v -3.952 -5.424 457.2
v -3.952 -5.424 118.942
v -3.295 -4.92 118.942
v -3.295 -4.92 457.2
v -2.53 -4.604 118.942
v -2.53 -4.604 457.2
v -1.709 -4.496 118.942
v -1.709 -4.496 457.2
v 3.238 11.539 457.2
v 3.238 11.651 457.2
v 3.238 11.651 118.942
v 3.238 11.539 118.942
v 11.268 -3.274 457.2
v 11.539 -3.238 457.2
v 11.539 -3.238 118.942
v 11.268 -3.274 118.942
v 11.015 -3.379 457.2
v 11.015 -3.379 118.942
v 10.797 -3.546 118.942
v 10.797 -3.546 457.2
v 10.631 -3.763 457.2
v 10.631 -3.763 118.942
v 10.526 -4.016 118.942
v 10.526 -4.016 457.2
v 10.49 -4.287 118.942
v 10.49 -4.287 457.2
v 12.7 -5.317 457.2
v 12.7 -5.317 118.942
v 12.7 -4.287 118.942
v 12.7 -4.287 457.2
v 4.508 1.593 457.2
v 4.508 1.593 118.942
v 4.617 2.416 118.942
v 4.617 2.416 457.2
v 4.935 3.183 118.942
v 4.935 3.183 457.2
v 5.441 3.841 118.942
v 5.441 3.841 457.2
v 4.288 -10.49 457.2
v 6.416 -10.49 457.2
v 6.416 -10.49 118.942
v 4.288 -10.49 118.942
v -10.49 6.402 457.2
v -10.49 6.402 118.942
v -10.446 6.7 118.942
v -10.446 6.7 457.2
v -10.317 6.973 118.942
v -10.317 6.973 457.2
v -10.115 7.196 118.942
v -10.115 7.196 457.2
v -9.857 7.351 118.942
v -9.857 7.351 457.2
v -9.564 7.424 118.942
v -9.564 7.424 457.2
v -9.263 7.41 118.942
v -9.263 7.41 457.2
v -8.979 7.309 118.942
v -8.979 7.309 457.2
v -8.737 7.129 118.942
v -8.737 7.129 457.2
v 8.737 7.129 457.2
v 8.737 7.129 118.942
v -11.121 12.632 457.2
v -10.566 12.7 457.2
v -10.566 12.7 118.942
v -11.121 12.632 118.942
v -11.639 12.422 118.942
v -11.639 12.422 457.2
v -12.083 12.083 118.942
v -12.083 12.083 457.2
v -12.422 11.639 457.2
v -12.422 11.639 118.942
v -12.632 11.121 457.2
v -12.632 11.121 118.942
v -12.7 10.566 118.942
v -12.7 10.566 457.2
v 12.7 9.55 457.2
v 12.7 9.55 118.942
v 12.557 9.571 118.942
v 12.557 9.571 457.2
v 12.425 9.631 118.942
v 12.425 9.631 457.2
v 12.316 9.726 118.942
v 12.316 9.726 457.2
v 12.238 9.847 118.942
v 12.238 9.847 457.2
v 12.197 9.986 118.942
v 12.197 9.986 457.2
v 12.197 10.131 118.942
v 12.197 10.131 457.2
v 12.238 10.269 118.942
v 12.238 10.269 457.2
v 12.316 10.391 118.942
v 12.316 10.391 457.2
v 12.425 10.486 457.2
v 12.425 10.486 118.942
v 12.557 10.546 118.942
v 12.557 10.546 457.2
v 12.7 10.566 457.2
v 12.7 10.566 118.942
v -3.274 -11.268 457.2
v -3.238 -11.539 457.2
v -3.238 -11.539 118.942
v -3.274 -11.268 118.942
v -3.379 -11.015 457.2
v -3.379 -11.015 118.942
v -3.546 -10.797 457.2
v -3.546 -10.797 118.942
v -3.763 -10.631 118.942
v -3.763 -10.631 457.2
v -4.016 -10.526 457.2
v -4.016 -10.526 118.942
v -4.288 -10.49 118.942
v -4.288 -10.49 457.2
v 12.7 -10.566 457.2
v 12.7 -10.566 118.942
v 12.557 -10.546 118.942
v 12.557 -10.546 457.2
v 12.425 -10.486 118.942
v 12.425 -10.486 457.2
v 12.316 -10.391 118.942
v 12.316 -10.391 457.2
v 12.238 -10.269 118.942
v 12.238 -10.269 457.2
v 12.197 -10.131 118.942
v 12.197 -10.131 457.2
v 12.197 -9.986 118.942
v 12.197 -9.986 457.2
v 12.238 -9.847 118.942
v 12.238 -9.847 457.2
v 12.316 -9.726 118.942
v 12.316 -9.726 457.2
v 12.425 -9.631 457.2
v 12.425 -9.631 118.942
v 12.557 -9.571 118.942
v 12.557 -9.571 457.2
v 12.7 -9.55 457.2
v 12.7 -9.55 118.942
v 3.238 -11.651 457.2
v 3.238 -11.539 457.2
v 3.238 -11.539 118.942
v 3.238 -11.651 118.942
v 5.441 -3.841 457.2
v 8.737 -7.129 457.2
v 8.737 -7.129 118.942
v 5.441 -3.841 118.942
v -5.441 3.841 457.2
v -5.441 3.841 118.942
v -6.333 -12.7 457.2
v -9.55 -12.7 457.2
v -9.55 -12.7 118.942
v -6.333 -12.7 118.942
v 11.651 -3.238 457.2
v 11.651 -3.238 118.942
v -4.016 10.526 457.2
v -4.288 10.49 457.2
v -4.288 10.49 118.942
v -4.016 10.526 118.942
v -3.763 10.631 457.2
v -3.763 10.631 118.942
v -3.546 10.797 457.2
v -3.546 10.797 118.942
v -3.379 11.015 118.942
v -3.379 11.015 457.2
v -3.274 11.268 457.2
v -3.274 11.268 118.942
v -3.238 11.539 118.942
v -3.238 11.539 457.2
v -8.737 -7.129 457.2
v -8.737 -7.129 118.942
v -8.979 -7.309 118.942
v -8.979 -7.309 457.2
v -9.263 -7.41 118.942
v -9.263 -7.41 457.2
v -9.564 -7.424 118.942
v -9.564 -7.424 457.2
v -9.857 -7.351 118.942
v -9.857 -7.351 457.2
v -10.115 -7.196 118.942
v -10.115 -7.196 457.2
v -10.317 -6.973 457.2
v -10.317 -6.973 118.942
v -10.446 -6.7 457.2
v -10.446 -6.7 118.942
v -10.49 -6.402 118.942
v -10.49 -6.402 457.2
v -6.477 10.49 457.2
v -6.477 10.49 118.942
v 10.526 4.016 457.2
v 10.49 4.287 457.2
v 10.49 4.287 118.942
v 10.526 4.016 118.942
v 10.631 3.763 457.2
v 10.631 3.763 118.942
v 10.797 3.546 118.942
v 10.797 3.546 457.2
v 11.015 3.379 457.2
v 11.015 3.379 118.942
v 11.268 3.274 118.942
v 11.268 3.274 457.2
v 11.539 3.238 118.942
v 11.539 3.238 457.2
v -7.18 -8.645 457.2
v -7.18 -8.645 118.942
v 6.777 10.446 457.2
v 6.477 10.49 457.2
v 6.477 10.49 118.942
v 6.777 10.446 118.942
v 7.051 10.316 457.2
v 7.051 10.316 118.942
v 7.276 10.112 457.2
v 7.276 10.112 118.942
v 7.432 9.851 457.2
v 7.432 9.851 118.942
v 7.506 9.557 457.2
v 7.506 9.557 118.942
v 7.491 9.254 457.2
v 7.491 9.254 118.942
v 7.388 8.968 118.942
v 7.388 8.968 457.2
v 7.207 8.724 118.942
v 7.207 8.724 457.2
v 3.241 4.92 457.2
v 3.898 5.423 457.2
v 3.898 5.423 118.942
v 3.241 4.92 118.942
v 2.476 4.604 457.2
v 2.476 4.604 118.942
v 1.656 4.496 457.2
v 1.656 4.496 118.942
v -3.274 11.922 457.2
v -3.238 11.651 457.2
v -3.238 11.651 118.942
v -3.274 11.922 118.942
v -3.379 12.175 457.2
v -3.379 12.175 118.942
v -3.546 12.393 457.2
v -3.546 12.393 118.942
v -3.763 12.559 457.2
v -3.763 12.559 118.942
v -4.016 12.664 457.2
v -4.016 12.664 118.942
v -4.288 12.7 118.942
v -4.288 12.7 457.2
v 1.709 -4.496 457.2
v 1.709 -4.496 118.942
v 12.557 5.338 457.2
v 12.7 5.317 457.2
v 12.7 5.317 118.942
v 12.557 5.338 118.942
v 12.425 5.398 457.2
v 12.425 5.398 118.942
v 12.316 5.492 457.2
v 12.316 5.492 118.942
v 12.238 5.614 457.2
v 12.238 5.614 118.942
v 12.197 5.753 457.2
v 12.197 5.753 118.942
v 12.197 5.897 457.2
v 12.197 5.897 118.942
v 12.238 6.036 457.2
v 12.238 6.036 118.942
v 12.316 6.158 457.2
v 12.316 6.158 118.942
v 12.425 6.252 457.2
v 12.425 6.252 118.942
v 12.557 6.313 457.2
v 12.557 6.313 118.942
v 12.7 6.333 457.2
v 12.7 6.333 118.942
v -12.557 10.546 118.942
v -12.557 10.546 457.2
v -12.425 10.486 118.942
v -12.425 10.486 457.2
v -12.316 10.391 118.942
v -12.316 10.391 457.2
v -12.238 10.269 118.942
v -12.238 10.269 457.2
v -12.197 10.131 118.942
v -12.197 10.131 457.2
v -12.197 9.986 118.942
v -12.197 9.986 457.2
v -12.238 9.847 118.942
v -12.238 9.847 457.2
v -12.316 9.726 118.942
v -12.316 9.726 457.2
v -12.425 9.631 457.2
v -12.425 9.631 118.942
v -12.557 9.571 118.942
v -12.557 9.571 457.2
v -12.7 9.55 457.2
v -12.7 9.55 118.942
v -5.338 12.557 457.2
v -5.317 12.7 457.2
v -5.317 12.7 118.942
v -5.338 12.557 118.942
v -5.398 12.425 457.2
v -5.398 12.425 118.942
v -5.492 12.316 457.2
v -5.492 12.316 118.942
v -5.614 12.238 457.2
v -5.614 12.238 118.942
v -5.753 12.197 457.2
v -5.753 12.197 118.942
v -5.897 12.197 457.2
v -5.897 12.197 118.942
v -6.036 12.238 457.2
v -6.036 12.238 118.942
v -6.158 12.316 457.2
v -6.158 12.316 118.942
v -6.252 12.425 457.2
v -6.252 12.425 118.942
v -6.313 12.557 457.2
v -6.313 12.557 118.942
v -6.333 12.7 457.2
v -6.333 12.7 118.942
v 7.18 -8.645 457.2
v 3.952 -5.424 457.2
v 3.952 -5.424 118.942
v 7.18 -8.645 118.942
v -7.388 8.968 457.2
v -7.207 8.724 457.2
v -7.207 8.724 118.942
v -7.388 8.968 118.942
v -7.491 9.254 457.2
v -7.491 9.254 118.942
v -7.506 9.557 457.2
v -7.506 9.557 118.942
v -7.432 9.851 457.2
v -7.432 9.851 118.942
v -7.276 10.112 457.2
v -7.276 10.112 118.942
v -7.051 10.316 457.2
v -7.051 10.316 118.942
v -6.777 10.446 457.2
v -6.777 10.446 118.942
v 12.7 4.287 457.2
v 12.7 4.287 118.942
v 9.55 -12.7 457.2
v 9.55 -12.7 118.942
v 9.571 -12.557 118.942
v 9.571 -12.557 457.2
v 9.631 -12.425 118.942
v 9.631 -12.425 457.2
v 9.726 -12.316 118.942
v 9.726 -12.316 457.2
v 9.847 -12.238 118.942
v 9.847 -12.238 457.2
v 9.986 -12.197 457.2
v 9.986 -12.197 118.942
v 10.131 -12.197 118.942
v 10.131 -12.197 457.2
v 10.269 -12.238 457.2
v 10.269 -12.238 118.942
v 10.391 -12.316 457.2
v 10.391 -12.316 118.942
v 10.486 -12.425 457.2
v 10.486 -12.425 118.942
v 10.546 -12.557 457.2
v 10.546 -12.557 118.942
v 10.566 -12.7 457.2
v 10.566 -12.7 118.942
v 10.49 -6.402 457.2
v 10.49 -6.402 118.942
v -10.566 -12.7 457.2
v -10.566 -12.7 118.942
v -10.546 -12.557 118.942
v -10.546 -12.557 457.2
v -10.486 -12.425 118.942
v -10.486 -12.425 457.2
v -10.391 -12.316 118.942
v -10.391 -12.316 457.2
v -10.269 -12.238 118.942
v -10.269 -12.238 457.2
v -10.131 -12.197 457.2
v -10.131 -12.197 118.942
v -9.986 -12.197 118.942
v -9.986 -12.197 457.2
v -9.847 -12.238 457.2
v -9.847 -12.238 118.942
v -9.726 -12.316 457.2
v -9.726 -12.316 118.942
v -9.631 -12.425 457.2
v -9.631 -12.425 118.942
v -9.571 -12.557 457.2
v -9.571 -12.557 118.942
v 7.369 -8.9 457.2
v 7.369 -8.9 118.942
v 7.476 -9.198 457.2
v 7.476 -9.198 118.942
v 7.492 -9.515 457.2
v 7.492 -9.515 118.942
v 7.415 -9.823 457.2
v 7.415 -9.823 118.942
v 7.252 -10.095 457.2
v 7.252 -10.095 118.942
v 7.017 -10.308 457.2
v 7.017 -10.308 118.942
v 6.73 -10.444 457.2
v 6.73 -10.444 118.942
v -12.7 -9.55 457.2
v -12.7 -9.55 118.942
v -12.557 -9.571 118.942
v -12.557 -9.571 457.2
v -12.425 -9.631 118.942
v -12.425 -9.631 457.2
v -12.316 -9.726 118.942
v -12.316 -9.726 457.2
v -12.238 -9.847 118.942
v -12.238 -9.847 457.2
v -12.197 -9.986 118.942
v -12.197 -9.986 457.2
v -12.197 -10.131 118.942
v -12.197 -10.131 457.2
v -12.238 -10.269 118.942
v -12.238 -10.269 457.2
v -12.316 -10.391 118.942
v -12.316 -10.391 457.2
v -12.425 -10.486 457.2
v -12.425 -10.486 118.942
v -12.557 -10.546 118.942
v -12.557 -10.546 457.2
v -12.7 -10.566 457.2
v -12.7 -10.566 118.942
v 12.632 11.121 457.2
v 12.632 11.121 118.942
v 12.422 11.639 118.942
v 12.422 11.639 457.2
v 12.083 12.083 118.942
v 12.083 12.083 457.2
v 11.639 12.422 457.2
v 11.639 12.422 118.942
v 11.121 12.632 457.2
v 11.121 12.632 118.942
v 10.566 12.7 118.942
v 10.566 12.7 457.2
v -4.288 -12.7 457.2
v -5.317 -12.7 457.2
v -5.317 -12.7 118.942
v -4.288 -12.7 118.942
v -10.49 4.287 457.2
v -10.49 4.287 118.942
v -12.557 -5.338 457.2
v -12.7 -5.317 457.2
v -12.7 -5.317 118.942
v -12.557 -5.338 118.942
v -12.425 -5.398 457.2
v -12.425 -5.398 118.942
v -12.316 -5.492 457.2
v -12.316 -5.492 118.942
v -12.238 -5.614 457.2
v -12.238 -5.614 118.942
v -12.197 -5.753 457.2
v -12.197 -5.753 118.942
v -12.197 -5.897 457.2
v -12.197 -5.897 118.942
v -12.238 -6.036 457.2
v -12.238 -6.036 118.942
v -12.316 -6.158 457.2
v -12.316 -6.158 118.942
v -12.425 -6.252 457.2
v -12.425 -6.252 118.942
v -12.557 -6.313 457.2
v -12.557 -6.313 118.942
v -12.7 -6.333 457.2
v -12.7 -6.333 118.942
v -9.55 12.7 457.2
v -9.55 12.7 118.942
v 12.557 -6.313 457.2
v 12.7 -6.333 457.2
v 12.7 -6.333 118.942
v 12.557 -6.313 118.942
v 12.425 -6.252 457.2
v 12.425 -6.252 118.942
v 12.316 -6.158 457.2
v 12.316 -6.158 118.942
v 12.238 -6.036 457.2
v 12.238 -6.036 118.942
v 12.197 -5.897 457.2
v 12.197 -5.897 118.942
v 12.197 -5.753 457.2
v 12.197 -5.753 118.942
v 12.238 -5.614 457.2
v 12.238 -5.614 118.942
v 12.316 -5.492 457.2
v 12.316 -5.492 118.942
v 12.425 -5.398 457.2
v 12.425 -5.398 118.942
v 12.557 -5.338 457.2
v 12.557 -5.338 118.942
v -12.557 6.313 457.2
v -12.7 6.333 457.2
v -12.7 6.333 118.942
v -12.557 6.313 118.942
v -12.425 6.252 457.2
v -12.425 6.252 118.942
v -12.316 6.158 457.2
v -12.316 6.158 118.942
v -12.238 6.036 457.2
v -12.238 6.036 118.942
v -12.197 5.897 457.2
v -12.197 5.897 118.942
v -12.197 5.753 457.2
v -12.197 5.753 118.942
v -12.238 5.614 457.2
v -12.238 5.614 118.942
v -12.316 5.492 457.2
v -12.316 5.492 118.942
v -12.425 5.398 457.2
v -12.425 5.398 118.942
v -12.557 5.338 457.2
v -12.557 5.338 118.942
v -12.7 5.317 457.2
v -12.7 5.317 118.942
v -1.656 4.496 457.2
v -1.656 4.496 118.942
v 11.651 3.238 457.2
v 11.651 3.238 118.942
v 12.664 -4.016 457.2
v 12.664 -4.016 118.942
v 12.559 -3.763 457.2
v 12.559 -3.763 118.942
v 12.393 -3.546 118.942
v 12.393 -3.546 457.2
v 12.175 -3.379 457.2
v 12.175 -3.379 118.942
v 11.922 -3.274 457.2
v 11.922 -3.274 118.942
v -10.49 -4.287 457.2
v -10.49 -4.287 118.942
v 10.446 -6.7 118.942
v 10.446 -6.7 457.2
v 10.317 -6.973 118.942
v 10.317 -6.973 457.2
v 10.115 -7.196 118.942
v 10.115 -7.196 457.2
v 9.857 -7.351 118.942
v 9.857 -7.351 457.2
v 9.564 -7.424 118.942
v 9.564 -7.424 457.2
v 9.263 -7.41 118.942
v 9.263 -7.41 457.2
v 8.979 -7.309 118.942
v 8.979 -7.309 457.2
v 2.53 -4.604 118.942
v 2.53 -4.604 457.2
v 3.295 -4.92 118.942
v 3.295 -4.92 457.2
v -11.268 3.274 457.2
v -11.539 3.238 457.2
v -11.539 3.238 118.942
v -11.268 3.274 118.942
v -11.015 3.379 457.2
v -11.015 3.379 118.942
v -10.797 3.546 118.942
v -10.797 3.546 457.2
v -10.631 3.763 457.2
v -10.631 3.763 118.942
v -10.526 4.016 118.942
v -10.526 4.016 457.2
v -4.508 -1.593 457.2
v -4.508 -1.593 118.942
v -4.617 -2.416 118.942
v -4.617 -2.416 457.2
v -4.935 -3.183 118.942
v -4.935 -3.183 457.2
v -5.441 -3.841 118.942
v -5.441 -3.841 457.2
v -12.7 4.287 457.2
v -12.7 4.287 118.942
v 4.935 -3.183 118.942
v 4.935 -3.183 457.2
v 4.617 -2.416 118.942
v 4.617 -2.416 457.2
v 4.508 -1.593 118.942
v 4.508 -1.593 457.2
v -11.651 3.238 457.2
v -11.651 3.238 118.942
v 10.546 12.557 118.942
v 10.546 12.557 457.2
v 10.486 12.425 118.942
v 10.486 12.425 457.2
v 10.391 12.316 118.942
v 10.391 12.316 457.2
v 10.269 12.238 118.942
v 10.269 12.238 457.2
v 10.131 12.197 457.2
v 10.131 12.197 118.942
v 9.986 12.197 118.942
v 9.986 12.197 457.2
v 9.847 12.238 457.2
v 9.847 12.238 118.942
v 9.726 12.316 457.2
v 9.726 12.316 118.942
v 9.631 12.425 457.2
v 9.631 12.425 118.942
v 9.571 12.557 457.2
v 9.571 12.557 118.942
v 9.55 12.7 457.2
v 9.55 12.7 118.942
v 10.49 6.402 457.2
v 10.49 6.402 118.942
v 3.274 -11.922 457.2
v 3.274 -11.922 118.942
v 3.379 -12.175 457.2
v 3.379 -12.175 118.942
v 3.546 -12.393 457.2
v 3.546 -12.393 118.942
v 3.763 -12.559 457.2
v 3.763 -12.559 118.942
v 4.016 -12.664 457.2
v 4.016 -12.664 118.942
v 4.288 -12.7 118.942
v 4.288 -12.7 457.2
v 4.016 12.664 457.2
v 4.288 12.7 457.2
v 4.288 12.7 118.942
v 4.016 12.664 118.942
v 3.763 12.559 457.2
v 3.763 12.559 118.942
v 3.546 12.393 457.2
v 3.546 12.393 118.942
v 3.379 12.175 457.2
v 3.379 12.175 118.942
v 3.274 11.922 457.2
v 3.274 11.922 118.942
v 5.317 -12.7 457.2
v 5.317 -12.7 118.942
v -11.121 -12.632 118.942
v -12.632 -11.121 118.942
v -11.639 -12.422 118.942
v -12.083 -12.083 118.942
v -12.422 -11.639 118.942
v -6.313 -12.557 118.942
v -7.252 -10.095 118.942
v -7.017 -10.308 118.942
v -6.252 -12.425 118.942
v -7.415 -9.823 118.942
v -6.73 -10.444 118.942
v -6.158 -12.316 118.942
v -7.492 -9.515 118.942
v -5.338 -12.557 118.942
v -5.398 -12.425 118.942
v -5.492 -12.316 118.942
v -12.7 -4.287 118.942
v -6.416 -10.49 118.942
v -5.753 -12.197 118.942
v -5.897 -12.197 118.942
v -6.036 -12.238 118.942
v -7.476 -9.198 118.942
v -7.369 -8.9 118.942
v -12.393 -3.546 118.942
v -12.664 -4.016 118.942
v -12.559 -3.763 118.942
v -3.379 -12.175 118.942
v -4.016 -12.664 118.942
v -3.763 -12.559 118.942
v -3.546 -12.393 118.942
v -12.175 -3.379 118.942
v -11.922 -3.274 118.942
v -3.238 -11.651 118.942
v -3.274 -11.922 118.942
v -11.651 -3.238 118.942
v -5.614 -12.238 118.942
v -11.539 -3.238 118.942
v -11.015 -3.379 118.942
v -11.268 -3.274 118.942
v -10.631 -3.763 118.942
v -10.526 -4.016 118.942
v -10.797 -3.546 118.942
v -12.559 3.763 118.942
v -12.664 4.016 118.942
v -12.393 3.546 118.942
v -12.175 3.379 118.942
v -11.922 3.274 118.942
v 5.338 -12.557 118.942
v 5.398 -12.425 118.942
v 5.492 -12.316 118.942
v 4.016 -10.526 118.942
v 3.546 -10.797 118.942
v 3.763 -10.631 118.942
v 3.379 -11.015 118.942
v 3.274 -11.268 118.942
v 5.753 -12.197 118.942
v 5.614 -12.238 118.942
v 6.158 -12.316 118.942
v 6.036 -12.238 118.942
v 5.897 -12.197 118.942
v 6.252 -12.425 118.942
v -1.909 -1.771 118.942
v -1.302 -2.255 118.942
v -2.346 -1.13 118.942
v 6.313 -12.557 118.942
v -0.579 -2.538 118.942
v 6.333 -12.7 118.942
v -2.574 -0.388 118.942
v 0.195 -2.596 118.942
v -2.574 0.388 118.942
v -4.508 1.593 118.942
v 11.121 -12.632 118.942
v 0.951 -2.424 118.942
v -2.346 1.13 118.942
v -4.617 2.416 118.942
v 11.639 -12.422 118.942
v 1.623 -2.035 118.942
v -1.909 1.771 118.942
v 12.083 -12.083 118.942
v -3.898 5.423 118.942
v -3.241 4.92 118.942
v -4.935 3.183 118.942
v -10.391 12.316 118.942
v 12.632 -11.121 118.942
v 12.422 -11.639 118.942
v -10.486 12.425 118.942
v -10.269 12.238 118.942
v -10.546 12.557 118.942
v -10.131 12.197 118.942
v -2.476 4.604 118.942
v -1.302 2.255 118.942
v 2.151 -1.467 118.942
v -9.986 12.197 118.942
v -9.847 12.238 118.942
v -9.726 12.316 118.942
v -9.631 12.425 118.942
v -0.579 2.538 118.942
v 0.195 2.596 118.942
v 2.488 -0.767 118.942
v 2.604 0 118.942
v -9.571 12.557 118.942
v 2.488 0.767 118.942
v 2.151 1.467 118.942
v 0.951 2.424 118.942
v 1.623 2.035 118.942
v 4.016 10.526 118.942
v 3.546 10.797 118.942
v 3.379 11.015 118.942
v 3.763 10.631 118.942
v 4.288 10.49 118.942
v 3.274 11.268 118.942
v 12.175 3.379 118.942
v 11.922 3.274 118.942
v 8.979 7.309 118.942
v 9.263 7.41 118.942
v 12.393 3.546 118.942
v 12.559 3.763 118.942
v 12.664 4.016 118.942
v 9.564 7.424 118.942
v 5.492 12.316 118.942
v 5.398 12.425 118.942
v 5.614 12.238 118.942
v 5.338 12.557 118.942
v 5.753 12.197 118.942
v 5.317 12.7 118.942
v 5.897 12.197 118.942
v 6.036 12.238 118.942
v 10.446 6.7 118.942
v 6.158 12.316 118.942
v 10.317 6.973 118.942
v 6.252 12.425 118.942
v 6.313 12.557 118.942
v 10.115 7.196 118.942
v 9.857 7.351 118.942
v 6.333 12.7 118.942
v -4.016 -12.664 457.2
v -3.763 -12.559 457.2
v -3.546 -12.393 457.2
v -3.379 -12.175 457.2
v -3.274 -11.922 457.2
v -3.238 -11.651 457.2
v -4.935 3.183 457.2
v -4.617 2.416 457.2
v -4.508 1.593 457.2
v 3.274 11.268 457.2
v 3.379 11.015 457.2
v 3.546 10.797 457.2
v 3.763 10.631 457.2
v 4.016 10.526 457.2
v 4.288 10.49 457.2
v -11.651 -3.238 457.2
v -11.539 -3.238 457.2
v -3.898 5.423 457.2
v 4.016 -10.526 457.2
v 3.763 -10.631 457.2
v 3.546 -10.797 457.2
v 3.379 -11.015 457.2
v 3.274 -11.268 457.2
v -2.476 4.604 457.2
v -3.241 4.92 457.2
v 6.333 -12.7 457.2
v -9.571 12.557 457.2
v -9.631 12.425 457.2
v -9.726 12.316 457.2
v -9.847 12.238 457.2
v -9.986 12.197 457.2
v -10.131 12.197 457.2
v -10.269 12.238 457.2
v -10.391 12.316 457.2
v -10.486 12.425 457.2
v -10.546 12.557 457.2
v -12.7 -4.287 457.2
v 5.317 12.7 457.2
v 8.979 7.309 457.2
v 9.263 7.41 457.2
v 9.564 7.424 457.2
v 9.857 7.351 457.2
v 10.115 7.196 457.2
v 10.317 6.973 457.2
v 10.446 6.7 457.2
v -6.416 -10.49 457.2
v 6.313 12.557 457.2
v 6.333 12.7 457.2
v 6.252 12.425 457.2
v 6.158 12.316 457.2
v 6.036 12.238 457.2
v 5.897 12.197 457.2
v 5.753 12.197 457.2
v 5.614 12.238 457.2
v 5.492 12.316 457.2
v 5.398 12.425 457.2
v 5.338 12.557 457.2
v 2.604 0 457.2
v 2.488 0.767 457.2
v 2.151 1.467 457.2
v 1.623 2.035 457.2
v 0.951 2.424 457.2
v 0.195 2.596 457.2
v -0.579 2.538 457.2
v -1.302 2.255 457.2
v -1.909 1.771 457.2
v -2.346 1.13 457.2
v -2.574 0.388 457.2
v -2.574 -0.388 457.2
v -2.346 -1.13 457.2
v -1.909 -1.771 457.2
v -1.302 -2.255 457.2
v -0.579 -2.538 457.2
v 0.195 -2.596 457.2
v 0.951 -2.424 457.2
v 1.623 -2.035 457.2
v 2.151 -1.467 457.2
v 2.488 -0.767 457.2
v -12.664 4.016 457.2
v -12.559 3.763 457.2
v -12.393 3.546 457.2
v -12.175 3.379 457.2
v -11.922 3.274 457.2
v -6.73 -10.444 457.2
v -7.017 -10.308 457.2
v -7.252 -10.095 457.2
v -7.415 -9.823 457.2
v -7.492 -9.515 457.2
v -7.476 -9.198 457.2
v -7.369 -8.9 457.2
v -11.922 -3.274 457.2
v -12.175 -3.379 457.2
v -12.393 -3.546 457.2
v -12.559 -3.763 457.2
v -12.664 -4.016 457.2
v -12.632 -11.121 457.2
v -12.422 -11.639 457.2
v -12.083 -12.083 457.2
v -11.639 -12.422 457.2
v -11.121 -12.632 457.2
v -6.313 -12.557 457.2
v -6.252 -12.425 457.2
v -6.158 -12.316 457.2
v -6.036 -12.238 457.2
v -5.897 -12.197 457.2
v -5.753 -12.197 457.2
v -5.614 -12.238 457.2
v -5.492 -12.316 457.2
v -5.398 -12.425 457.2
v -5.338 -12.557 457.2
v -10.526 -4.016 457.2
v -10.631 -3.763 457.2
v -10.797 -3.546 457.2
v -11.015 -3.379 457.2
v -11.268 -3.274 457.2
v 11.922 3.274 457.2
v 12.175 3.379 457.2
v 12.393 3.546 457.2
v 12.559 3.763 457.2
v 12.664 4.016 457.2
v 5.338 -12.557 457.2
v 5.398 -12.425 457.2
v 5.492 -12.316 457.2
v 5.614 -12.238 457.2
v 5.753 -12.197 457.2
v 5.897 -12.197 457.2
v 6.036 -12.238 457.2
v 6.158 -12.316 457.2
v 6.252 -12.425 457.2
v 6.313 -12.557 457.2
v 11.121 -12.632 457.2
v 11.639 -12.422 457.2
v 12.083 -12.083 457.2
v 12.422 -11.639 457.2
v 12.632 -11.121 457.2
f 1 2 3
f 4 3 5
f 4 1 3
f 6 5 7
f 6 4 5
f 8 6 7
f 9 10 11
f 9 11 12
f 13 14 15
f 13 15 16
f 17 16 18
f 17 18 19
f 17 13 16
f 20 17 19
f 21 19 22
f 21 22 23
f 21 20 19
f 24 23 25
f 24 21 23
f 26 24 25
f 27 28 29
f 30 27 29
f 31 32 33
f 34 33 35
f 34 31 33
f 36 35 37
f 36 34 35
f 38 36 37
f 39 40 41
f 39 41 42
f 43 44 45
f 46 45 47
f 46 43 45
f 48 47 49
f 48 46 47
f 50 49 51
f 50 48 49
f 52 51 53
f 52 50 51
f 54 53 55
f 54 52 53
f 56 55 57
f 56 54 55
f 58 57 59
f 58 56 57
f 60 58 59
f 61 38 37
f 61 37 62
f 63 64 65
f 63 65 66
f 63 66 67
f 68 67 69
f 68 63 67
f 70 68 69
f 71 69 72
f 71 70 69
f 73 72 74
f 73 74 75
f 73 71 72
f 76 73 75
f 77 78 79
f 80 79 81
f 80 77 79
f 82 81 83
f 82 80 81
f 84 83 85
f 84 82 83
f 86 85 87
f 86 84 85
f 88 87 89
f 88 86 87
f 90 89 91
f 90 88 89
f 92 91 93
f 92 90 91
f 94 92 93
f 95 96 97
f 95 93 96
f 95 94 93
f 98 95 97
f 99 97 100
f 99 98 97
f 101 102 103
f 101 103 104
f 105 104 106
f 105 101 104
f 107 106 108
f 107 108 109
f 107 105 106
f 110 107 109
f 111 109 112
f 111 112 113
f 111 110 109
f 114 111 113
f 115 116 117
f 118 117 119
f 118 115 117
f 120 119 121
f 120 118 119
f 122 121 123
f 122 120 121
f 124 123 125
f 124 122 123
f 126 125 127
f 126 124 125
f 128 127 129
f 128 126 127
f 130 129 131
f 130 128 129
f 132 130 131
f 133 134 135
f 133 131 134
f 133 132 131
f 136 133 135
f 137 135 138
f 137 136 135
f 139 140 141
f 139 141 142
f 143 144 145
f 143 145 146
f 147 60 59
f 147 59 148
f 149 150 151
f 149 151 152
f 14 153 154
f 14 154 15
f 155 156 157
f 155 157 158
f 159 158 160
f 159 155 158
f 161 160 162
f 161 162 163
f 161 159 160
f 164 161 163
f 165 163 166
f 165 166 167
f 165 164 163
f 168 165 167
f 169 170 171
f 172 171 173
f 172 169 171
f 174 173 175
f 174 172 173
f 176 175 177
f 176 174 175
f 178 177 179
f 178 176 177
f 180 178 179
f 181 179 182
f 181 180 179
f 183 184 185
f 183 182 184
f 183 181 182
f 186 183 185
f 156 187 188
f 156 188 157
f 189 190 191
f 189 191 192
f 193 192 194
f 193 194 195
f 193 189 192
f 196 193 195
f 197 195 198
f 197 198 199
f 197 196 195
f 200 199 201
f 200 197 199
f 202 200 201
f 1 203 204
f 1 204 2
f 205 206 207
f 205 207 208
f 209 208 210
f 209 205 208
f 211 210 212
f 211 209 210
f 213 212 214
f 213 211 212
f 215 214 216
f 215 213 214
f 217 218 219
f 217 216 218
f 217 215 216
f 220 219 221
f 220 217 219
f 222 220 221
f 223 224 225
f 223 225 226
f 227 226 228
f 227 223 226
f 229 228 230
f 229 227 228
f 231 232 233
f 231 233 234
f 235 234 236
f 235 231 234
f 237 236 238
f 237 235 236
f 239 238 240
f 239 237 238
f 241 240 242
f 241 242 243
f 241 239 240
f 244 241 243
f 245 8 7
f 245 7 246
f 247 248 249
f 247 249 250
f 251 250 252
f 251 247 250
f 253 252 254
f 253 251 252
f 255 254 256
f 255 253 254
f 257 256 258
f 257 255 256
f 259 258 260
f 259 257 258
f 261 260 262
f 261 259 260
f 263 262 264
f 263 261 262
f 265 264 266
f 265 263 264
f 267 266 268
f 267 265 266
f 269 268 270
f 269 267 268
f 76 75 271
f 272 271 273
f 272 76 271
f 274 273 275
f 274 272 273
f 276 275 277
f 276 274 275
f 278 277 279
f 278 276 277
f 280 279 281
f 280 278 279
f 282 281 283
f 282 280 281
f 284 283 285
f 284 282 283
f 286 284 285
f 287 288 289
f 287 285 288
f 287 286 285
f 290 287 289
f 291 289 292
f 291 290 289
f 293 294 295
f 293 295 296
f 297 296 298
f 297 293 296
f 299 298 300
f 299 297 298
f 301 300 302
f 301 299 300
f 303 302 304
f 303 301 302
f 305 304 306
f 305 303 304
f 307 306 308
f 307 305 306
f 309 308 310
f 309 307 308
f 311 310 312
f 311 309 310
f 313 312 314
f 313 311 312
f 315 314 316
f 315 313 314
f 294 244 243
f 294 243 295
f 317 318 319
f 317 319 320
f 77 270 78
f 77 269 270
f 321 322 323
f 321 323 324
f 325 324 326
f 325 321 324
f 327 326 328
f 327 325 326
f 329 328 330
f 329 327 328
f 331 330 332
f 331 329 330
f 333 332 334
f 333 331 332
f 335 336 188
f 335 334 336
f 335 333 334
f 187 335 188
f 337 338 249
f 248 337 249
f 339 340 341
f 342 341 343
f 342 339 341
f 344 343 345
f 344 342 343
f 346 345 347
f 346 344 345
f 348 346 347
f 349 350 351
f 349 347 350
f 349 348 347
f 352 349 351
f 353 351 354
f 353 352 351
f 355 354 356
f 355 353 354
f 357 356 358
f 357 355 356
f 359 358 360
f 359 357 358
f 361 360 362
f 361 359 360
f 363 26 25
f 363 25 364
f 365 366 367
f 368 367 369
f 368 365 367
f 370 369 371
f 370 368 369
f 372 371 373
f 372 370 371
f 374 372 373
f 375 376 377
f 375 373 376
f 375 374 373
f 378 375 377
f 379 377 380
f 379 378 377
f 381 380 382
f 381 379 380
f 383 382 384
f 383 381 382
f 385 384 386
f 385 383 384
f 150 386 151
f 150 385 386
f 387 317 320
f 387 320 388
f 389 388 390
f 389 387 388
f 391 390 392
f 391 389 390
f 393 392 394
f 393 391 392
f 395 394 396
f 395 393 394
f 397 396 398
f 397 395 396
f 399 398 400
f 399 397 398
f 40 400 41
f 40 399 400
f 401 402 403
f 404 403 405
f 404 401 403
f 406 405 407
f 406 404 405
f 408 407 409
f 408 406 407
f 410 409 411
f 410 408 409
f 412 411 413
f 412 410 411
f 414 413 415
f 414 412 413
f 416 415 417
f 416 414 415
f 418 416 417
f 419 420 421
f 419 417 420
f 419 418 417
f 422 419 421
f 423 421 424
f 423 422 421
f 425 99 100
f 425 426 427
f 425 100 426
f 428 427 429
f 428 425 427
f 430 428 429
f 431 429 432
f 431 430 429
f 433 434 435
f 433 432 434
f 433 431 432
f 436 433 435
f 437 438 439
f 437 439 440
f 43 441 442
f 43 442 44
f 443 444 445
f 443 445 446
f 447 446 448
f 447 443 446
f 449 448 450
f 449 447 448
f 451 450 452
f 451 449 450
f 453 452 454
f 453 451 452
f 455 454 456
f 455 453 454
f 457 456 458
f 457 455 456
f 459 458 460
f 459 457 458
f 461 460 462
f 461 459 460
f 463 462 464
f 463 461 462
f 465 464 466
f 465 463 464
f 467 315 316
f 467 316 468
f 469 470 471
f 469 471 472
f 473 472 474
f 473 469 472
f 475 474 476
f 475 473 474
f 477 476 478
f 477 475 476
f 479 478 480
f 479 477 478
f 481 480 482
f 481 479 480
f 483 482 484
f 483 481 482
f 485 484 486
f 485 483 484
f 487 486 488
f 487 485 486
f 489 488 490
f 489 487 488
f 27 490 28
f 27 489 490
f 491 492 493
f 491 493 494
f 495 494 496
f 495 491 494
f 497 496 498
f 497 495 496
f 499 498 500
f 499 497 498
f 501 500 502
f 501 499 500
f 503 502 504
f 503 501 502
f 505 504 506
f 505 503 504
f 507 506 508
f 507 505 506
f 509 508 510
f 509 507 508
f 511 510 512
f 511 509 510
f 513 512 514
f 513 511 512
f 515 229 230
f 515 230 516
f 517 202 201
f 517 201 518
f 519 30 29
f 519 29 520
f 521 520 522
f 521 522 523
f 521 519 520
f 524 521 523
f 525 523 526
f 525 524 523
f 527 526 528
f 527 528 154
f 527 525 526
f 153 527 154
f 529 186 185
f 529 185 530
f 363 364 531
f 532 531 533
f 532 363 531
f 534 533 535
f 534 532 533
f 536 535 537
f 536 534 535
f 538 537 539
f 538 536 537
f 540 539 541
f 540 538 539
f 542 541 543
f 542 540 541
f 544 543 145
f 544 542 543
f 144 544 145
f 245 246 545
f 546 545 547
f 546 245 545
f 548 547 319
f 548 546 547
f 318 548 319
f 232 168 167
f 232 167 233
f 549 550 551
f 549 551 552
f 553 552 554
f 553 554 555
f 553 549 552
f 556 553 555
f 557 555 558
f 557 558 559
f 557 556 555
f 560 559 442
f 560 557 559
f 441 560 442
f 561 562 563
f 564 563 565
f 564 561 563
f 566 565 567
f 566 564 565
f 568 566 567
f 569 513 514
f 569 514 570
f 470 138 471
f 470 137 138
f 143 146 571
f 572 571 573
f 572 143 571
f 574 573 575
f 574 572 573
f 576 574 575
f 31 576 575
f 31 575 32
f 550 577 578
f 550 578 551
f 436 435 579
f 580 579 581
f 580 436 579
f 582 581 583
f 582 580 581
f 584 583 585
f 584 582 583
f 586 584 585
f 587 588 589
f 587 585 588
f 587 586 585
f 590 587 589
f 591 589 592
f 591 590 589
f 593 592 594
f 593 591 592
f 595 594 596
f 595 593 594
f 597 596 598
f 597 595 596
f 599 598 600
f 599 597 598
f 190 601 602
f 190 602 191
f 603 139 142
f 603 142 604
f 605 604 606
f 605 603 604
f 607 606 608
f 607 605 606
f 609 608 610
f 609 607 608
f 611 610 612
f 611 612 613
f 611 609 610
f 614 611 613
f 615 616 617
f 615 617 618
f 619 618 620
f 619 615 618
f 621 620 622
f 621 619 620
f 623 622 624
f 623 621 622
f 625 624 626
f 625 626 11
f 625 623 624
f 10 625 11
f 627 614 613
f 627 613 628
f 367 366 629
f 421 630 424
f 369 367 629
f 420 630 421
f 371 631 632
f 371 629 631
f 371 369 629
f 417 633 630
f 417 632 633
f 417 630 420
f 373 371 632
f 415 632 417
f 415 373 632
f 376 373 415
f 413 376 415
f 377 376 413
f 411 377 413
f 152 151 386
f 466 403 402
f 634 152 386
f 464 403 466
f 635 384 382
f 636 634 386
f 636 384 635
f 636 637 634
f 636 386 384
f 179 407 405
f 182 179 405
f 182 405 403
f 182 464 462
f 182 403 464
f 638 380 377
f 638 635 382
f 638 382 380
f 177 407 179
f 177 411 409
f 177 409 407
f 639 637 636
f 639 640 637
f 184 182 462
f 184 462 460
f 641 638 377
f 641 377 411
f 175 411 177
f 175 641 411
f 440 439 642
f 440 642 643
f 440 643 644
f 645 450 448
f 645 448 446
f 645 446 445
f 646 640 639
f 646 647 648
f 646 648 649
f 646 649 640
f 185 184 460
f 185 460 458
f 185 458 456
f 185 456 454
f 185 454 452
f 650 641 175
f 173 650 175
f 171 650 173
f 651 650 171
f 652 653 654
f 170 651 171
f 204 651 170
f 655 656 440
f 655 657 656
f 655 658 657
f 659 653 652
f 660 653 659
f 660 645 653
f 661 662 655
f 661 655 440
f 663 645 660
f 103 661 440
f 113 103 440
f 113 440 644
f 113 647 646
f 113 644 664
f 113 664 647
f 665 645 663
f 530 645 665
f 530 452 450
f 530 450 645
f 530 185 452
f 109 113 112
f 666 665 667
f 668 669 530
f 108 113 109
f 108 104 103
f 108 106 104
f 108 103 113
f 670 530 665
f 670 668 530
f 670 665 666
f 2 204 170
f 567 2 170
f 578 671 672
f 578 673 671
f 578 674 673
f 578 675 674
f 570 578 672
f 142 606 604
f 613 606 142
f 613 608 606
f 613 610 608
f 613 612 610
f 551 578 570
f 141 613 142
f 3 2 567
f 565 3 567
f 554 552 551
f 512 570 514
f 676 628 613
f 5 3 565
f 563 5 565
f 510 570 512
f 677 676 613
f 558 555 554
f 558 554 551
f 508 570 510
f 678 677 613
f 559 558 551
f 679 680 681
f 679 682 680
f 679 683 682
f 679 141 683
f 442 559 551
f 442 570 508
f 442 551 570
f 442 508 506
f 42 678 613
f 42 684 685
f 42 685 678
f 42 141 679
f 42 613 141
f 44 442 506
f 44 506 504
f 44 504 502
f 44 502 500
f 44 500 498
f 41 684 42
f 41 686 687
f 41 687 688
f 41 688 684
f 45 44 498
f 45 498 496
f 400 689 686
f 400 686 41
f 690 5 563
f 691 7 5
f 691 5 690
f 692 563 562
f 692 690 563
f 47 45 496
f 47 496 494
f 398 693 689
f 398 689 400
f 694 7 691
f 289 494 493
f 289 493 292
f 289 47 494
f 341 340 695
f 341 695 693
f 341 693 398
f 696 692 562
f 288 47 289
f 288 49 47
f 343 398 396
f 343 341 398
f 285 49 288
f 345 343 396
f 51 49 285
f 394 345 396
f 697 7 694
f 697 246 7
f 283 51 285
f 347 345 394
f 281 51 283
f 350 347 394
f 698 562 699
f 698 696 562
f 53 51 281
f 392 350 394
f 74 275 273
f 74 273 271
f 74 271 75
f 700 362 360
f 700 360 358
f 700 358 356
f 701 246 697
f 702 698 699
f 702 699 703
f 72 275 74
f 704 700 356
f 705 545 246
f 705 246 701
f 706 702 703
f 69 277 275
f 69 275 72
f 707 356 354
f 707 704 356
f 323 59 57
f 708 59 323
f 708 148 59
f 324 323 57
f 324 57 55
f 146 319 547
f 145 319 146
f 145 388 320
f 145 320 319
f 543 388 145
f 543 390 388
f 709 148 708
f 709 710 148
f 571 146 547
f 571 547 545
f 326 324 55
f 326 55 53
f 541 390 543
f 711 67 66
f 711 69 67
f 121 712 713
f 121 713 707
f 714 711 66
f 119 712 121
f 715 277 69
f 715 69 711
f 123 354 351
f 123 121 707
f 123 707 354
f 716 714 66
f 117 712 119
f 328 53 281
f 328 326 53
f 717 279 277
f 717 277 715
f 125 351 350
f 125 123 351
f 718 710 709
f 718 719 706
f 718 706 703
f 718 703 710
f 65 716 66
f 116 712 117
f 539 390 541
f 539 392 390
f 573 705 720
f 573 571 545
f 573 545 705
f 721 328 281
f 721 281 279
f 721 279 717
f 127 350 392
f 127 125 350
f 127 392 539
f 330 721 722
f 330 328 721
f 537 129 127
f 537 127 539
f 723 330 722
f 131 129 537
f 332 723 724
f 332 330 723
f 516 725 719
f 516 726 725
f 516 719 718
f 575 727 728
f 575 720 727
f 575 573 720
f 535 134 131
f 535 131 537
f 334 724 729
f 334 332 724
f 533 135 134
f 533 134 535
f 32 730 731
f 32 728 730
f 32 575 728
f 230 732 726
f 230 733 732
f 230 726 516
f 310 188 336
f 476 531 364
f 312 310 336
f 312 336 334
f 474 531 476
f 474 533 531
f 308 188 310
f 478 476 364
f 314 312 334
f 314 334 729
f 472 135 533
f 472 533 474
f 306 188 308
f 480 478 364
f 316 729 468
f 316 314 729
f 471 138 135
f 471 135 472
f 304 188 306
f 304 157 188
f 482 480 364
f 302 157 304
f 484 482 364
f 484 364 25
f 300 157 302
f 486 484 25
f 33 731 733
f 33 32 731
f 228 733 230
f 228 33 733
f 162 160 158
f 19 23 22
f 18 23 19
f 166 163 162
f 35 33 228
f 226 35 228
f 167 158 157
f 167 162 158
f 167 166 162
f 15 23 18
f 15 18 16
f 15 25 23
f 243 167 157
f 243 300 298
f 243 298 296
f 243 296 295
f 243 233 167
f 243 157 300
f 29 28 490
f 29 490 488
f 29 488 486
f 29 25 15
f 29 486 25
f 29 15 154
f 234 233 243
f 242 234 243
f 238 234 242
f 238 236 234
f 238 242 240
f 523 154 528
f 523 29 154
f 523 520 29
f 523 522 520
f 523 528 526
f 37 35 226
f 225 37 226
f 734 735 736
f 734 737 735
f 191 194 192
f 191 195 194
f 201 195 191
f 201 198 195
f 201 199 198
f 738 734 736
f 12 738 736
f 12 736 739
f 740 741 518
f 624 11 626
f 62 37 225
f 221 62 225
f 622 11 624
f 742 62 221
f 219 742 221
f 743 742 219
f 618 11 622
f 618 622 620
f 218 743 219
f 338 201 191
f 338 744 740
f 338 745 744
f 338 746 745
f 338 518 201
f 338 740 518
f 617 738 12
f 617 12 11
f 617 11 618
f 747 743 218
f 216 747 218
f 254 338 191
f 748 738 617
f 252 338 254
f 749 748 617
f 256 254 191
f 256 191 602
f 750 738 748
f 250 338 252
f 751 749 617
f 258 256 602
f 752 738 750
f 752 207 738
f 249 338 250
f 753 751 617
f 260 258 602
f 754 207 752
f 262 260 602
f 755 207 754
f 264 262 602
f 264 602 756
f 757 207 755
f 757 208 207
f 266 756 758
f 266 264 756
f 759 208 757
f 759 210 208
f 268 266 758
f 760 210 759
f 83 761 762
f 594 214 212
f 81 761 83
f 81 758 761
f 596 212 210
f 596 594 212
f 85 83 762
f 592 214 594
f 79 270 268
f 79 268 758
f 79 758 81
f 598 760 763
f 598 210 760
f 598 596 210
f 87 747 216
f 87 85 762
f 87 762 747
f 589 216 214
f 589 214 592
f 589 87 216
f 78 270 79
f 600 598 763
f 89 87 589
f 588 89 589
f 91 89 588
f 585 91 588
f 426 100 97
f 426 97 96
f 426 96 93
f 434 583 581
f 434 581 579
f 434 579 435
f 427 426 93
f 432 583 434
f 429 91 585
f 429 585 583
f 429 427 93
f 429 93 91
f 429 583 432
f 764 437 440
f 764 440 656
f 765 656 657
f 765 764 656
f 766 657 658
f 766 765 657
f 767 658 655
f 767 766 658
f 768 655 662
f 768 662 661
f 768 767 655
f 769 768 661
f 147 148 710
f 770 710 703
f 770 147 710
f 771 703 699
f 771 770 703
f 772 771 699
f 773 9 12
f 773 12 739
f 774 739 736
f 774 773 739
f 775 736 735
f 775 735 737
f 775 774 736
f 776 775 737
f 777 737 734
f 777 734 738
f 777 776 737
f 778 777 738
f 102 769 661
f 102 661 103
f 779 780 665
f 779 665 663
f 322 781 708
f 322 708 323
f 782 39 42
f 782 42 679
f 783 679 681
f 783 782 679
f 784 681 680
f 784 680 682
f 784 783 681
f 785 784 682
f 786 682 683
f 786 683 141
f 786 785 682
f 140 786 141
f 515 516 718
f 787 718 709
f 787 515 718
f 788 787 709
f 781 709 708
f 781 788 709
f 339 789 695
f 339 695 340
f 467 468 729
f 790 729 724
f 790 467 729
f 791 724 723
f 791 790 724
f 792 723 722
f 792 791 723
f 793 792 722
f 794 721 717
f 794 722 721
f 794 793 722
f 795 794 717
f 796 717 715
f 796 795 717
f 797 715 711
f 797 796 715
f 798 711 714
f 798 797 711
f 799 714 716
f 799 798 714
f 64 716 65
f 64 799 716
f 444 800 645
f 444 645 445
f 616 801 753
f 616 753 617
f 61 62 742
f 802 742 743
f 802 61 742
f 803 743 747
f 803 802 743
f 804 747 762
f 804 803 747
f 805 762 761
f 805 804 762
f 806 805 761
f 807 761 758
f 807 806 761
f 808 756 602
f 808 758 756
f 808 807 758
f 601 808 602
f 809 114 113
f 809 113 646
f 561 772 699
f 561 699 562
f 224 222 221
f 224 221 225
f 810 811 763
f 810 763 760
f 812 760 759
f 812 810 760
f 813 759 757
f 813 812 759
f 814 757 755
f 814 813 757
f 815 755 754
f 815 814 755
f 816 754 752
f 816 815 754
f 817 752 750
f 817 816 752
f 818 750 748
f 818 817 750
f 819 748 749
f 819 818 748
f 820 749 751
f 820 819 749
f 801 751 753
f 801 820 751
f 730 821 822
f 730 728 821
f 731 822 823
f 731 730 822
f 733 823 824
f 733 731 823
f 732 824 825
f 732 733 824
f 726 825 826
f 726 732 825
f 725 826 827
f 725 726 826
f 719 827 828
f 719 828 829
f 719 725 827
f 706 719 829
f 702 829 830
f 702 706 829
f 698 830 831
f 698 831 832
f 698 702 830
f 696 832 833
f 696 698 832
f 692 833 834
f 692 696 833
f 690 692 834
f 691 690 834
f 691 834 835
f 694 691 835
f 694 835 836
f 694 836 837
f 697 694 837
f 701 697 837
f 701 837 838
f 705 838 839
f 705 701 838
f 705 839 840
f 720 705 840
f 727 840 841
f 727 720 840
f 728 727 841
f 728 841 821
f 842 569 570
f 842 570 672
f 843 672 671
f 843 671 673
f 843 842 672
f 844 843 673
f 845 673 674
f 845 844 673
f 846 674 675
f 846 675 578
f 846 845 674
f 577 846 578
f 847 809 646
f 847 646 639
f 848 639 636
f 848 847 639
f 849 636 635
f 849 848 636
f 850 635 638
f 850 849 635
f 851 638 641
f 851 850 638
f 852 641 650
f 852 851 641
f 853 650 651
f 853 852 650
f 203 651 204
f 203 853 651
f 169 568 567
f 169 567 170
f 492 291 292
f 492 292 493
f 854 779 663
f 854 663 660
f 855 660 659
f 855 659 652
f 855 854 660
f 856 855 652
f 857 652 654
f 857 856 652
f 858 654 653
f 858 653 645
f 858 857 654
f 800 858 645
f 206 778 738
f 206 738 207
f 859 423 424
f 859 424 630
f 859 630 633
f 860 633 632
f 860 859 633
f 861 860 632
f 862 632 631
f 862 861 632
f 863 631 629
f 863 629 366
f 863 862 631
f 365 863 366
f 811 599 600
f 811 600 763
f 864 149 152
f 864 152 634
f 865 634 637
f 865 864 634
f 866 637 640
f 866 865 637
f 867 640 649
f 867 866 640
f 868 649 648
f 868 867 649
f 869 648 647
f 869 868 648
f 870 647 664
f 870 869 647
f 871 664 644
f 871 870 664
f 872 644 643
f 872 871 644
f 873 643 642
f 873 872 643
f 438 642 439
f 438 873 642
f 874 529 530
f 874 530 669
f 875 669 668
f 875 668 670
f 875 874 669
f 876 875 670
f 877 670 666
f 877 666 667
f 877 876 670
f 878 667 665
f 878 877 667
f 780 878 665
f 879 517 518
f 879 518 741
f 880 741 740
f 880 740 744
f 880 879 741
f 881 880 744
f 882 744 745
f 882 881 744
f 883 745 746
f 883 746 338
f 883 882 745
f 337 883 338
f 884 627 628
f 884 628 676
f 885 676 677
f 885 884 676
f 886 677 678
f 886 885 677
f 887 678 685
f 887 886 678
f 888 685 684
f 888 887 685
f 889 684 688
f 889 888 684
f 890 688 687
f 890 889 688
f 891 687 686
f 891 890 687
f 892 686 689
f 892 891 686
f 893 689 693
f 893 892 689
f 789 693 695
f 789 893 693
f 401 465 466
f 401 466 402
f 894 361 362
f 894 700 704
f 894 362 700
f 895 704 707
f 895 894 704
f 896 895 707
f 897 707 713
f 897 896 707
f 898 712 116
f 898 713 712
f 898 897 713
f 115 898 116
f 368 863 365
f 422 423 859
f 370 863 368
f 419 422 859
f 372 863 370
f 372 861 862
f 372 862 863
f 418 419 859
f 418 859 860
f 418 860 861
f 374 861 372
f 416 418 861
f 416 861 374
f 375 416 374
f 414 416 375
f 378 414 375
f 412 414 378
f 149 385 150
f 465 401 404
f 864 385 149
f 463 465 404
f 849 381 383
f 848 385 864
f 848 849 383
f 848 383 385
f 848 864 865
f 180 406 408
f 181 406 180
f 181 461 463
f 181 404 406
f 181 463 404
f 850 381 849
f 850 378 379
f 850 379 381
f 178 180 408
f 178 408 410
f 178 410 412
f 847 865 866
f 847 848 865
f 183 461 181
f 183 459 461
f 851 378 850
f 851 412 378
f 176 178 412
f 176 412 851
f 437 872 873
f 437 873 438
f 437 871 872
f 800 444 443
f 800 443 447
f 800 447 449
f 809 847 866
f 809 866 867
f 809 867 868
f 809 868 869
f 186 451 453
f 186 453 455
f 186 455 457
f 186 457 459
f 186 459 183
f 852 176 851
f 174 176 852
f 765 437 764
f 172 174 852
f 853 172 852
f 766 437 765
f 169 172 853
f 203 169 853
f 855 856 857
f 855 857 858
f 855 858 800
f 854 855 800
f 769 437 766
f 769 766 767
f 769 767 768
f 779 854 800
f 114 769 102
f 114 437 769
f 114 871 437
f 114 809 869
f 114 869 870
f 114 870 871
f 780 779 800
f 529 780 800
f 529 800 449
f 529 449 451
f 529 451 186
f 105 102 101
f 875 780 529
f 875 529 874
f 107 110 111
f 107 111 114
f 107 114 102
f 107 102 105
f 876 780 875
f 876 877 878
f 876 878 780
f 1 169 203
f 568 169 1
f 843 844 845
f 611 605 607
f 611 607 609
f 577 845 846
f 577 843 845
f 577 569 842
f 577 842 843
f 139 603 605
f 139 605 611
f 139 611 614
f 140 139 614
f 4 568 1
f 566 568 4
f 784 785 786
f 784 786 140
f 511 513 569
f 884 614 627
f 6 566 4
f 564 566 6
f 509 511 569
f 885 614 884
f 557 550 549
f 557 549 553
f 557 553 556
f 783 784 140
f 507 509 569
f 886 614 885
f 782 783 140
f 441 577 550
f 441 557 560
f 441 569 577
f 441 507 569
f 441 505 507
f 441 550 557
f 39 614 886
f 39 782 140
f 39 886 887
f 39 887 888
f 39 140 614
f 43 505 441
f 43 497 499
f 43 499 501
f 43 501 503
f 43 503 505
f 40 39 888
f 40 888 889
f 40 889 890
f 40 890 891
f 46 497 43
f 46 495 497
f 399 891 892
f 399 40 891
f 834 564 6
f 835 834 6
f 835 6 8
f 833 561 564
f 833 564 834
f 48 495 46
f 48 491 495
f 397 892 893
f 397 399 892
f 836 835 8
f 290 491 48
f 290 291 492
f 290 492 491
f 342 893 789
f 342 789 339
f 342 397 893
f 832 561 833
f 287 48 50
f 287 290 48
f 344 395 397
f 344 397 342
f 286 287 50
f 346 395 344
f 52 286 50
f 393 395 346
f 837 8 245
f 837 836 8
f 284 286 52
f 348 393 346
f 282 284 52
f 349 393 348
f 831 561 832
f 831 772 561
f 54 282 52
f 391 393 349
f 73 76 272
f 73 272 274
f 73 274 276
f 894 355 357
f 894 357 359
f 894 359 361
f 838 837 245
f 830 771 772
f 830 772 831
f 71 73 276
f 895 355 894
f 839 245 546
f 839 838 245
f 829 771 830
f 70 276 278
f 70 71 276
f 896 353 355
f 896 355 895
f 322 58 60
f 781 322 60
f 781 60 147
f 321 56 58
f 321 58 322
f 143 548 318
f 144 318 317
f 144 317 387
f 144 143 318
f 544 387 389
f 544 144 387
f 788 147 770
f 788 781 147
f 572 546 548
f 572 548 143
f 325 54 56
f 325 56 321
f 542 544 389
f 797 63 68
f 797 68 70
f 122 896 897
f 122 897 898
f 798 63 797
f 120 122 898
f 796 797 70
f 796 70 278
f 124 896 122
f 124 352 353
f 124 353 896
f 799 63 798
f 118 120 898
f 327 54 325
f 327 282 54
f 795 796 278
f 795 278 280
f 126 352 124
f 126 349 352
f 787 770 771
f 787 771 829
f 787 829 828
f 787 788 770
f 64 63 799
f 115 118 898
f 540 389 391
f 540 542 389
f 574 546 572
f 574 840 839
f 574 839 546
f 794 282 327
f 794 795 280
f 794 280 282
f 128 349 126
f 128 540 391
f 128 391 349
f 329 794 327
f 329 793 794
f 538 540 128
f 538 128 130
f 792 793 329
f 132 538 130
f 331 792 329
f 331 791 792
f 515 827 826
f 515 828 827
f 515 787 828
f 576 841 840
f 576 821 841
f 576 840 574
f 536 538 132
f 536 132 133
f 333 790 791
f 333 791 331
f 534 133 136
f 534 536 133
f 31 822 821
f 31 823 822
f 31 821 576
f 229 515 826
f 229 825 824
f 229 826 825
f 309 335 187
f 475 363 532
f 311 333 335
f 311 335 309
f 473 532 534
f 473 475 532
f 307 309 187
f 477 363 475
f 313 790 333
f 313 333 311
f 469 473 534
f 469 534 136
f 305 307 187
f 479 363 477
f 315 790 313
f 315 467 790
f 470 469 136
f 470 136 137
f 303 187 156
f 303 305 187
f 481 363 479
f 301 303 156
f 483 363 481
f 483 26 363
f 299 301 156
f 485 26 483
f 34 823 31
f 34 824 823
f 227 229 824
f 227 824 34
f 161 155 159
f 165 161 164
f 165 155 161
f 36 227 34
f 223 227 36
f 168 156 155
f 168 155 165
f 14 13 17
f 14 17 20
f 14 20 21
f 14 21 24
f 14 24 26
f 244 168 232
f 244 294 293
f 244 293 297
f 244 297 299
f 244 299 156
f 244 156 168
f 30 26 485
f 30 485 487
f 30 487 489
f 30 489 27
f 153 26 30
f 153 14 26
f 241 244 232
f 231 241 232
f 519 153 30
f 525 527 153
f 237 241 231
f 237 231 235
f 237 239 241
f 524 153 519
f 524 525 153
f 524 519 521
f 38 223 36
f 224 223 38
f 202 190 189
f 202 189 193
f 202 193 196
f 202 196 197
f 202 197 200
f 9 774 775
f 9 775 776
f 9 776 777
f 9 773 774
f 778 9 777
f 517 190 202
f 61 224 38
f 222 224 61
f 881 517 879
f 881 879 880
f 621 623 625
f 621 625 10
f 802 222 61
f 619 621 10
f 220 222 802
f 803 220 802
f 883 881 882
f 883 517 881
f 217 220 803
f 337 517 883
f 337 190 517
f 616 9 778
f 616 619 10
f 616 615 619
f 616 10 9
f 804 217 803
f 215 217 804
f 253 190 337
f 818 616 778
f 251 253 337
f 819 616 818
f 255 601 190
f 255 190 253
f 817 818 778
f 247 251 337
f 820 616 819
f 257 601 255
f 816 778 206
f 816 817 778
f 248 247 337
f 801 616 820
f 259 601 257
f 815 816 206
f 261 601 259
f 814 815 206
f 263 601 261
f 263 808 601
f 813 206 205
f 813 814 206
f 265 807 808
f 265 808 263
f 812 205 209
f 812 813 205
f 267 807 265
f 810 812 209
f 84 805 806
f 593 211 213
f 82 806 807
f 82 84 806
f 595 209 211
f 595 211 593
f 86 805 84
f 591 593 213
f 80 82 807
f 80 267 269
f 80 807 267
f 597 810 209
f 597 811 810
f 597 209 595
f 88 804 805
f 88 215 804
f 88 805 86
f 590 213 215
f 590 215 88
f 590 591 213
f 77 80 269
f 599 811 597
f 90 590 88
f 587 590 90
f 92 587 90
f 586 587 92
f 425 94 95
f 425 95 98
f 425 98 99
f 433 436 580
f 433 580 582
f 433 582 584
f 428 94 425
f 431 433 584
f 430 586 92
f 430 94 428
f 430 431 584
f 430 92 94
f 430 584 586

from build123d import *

# Parameters (mm, degrees)
SKETCH1_R               = 2.6035
BOSS_EXTRUDE1_DEPTH     = 457.2
CUT_EXTRUDE2_DEPTH      = 4.318
CUT_EXTRUDE2_DEPTH_BACK = 26.924
SKETCH4_W               = 324.910304918
SKETCH4_H               = 30.197320423
CUT_EXTRUDE3_DEPTH      = 1
CUT_EXTRUDE3_DEPTH_BACK = 26.4


with BuildPart() as part:
    # Sketch1 → Boss-Extrude1 (new body, symmetric)
    with BuildSketch(Plane.XY):
        with BuildLine():
            Line((-7.179650497, -8.645192506), (-3.952270251, -5.423690499))
            ThreePointArc((-3.952270251, -5.423690499), (-2.922936451, -4.736929036), (-1.709253557, -4.4958))
            Line((-1.709253557, -4.4958), (1.709253557, -4.4958))
            ThreePointArc((1.709253557, -4.4958), (2.922936451, -4.736929036), (3.952270251, -5.423690499))
            Line((3.952270251, -5.423690499), (7.179650497, -8.645192506))
            ThreePointArc((7.179650497, -8.645192506), (7.41473083, -9.822813117), (6.416408329, -10.4902))
            Line((6.416408329, -10.4902), (4.287512407, -10.4902))
            ThreePointArc((4.287512407, -10.4902), (3.54574862, -10.79744862), (3.2385, -11.539212407))
            Line((3.2385, -11.539212407), (3.2385, -11.650987593))
            ThreePointArc((3.2385, -11.650987593), (3.54574862, -12.39275138), (4.287512407, -12.7))
            Line((4.287512407, -12.7), (5.317126718, -12.7))
            ThreePointArc((5.317126718, -12.7), (5.825126718, -12.192), (6.333126718, -12.7))
            Line((6.333126718, -12.7), (9.550443118, -12.7))
            ThreePointArc((9.550443118, -12.7), (10.058366869, -12.192000006), (10.566443095, -12.699847501))
            ThreePointArc((10.566443095, -12.699847501), (12.082537762, -12.08250727), (12.699846982, -10.566399977))
            ThreePointArc((12.699846982, -10.566399977), (12.192000006, -10.058323491), (12.7, -9.5504))
            Line((12.7, -9.5504), (12.7, -6.3330836))
            ThreePointArc((12.7, -6.3330836), (12.192, -5.8250836), (12.7, -5.3170836))
            Line((12.7, -5.3170836), (12.7, -4.287469289))
            ThreePointArc((12.7, -4.287469289), (12.39275138, -3.545705502), (11.650987593, -3.238456882))
            Line((11.650987593, -3.238456882), (11.539212407, -3.238456882))
            ThreePointArc((11.539212407, -3.238456882), (10.79744862, -3.545705502), (10.4902, -4.287469289))
            Line((10.4902, -4.287469289), (10.4902, -6.402089023))
            ThreePointArc((10.4902, -6.402089023), (9.856505071, -7.351067942), (8.737131347, -7.129408934))
            Line((8.737131347, -7.129408934), (5.441005833, -3.840816462))
            ThreePointArc((5.441005833, -3.840816462), (4.750877967, -2.809883091), (4.5085, -1.593185507))
            Line((4.5085, -1.593185507), (4.5085, 1.593185507))
            ThreePointArc((4.5085, 1.593185507), (4.750877967, 2.809883091), (5.441005833, 3.840816462))
            Line((5.441005833, 3.840816462), (8.737131347, 7.129408934))
            ThreePointArc((8.737131347, 7.129408934), (9.856505071, 7.351067942), (10.4902, 6.402089023))
            Line((10.4902, 6.402089023), (10.4902, 4.287469289))
            ThreePointArc((10.4902, 4.287469289), (10.79744862, 3.545705502), (11.539212407, 3.238456882))
            Line((11.539212407, 3.238456882), (11.650987593, 3.238456882))
            ThreePointArc((11.650987593, 3.238456882), (12.39275138, 3.545705502), (12.7, 4.287469289))
            Line((12.7, 4.287469289), (12.7, 5.3170836))
            ThreePointArc((12.7, 5.3170836), (12.192, 5.8250836), (12.7, 6.3330836))
            Line((12.7, 6.3330836), (12.7, 9.5504))
            ThreePointArc((12.7, 9.5504), (12.192000006, 10.058323491), (12.699846982, 10.566399977))
            ThreePointArc((12.699846982, 10.566399977), (12.082537762, 12.08250727), (10.566443095, 12.699847501))
            ThreePointArc((10.566443095, 12.699847501), (10.058366869, 12.192000006), (9.550443118, 12.7))
            Line((9.550443118, 12.7), (6.333126718, 12.7))
            ThreePointArc((6.333126718, 12.7), (5.825126718, 12.192), (5.317126718, 12.7))
            Line((5.317126718, 12.7), (4.287512407, 12.7))
            ThreePointArc((4.287512407, 12.7), (3.54574862, 12.39275138), (3.2385, 11.650987593))
            Line((3.2385, 11.650987593), (3.2385, 11.539212407))
            ThreePointArc((3.2385, 11.539212407), (3.54574862, 10.79744862), (4.287512407, 10.4902))
            Line((4.287512407, 10.4902), (6.476788598, 10.4902))
            ThreePointArc((6.476788598, 10.4902), (7.432222385, 9.85140422), (7.207036008, 8.724370562))
            Line((7.207036008, 8.724370562), (3.898272566, 5.423169045))
            ThreePointArc((3.898272566, 5.423169045), (2.869120213, 4.736787962), (1.655778399, 4.4958))
            Line((1.655778399, 4.4958), (-1.655778399, 4.4958))
            ThreePointArc((-1.655778399, 4.4958), (-2.869120213, 4.736787962), (-3.898272566, 5.423169045))
            Line((-3.898272566, 5.423169045), (-7.207036008, 8.724370562))
            ThreePointArc((-7.207036008, 8.724370562), (-7.432222385, 9.85140422), (-6.476788598, 10.4902))
            Line((-6.476788598, 10.4902), (-4.287512407, 10.4902))
            ThreePointArc((-4.287512407, 10.4902), (-3.54574862, 10.79744862), (-3.2385, 11.539212407))
            Line((-3.2385, 11.539212407), (-3.2385, 11.650987593))
            ThreePointArc((-3.2385, 11.650987593), (-3.54574862, 12.39275138), (-4.287512407, 12.7))
            Line((-4.287512407, 12.7), (-5.317126718, 12.7))
            ThreePointArc((-5.317126718, 12.7), (-5.825126718, 12.192), (-6.333126718, 12.7))
            Line((-6.333126718, 12.7), (-9.550443118, 12.7))
            ThreePointArc((-9.550443118, 12.7), (-10.058366869, 12.192000006), (-10.566443095, 12.699847501))
            ThreePointArc((-10.566443095, 12.699847501), (-12.082537762, 12.08250727), (-12.699846982, 10.566399977))
            ThreePointArc((-12.699846982, 10.566399977), (-12.192000006, 10.058323491), (-12.7, 9.5504))
            Line((-12.7, 9.5504), (-12.7, 6.3330836))
            ThreePointArc((-12.7, 6.3330836), (-12.192, 5.8250836), (-12.7, 5.3170836))
            Line((-12.7, 5.3170836), (-12.7, 4.287469289))
            ThreePointArc((-12.7, 4.287469289), (-12.39275138, 3.545705502), (-11.650987593, 3.238456882))
            Line((-11.650987593, 3.238456882), (-11.539212407, 3.238456882))
            ThreePointArc((-11.539212407, 3.238456882), (-10.79744862, 3.545705502), (-10.4902, 4.287469289))
            Line((-10.4902, 4.287469289), (-10.4902, 6.402089023))
            ThreePointArc((-10.4902, 6.402089023), (-9.856505071, 7.351067942), (-8.737131347, 7.129408934))
            Line((-8.737131347, 7.129408934), (-5.441005833, 3.840816462))
            ThreePointArc((-5.441005833, 3.840816462), (-4.750877967, 2.809883091), (-4.5085, 1.593185507))
            Line((-4.5085, 1.593185507), (-4.5085, -1.593185507))
            ThreePointArc((-4.5085, -1.593185507), (-4.750877967, -2.809883091), (-5.441005833, -3.840816462))
            Line((-5.441005833, -3.840816462), (-8.737131347, -7.129408934))
            ThreePointArc((-8.737131347, -7.129408934), (-9.856505071, -7.351067942), (-10.4902, -6.402089023))
            Line((-10.4902, -6.402089023), (-10.4902, -4.287469289))
            ThreePointArc((-10.4902, -4.287469289), (-10.79744862, -3.545705502), (-11.539212407, -3.238456882))
            Line((-11.539212407, -3.238456882), (-11.650987593, -3.238456882))
            ThreePointArc((-11.650987593, -3.238456882), (-12.39275138, -3.545705502), (-12.7, -4.287469289))
            Line((-12.7, -4.287469289), (-12.7, -5.3170836))
            ThreePointArc((-12.7, -5.3170836), (-12.192, -5.8250836), (-12.7, -6.3330836))
            Line((-12.7, -6.3330836), (-12.7, -9.5504))
            ThreePointArc((-12.7, -9.5504), (-12.192000006, -10.058323491), (-12.699846982, -10.566399977))
            ThreePointArc((-12.699846982, -10.566399977), (-12.082537762, -12.08250727), (-10.566443095, -12.699847501))
            ThreePointArc((-10.566443095, -12.699847501), (-10.058366869, -12.192000006), (-9.550443118, -12.7))
            Line((-9.550443118, -12.7), (-6.333126718, -12.7))
            ThreePointArc((-6.333126718, -12.7), (-5.825126718, -12.192), (-5.317126718, -12.7))
            Line((-5.317126718, -12.7), (-4.287512407, -12.7))
            ThreePointArc((-4.287512407, -12.7), (-3.54574862, -12.39275138), (-3.2385, -11.650987593))
            Line((-3.2385, -11.650987593), (-3.2385, -11.539212407))
            ThreePointArc((-3.2385, -11.539212407), (-3.54574862, -10.79744862), (-4.287512407, -10.4902))
            Line((-4.287512407, -10.4902), (-6.416408329, -10.4902))
            ThreePointArc((-6.416408329, -10.4902), (-7.41473083, -9.822813117), (-7.179650497, -8.645192506))
        make_face()
        Circle(SKETCH1_R, mode=Mode.SUBTRACT)
    extrude(amount=BOSS_EXTRUDE1_DEPTH, both=True)

    # Sketch3 → Cut-Extrude2 (cut, two sides)
    with BuildSketch(Plane.ZY.offset(12.7)) as cut_extrude2_sk:
        Polygon((-203.2, -27.552777595), (-203.2, 21.158109763), (-461.090893327, 21.158109763), (-461.090893327, -25.4), align=None)
    extrude(amount=CUT_EXTRUDE2_DEPTH, mode=Mode.SUBTRACT)
    extrude(cut_extrude2_sk.sketch, amount=-CUT_EXTRUDE2_DEPTH_BACK, mode=Mode.SUBTRACT)

    # Sketch4 → Cut-Extrude3 (cut, two sides)
    with BuildSketch(Plane(origin=(12.7, 0, 0), x_dir=(0, 0, -1), z_dir=(1, 0, 0))) as cut_extrude3_sk:
        with Locations((43.51312076, -0.091464018)):
            Rectangle(SKETCH4_W, SKETCH4_H)
    extrude(amount=CUT_EXTRUDE3_DEPTH, mode=Mode.SUBTRACT)
    extrude(cut_extrude3_sk.sketch, amount=-CUT_EXTRUDE3_DEPTH_BACK, mode=Mode.SUBTRACT)


solid = part.part
